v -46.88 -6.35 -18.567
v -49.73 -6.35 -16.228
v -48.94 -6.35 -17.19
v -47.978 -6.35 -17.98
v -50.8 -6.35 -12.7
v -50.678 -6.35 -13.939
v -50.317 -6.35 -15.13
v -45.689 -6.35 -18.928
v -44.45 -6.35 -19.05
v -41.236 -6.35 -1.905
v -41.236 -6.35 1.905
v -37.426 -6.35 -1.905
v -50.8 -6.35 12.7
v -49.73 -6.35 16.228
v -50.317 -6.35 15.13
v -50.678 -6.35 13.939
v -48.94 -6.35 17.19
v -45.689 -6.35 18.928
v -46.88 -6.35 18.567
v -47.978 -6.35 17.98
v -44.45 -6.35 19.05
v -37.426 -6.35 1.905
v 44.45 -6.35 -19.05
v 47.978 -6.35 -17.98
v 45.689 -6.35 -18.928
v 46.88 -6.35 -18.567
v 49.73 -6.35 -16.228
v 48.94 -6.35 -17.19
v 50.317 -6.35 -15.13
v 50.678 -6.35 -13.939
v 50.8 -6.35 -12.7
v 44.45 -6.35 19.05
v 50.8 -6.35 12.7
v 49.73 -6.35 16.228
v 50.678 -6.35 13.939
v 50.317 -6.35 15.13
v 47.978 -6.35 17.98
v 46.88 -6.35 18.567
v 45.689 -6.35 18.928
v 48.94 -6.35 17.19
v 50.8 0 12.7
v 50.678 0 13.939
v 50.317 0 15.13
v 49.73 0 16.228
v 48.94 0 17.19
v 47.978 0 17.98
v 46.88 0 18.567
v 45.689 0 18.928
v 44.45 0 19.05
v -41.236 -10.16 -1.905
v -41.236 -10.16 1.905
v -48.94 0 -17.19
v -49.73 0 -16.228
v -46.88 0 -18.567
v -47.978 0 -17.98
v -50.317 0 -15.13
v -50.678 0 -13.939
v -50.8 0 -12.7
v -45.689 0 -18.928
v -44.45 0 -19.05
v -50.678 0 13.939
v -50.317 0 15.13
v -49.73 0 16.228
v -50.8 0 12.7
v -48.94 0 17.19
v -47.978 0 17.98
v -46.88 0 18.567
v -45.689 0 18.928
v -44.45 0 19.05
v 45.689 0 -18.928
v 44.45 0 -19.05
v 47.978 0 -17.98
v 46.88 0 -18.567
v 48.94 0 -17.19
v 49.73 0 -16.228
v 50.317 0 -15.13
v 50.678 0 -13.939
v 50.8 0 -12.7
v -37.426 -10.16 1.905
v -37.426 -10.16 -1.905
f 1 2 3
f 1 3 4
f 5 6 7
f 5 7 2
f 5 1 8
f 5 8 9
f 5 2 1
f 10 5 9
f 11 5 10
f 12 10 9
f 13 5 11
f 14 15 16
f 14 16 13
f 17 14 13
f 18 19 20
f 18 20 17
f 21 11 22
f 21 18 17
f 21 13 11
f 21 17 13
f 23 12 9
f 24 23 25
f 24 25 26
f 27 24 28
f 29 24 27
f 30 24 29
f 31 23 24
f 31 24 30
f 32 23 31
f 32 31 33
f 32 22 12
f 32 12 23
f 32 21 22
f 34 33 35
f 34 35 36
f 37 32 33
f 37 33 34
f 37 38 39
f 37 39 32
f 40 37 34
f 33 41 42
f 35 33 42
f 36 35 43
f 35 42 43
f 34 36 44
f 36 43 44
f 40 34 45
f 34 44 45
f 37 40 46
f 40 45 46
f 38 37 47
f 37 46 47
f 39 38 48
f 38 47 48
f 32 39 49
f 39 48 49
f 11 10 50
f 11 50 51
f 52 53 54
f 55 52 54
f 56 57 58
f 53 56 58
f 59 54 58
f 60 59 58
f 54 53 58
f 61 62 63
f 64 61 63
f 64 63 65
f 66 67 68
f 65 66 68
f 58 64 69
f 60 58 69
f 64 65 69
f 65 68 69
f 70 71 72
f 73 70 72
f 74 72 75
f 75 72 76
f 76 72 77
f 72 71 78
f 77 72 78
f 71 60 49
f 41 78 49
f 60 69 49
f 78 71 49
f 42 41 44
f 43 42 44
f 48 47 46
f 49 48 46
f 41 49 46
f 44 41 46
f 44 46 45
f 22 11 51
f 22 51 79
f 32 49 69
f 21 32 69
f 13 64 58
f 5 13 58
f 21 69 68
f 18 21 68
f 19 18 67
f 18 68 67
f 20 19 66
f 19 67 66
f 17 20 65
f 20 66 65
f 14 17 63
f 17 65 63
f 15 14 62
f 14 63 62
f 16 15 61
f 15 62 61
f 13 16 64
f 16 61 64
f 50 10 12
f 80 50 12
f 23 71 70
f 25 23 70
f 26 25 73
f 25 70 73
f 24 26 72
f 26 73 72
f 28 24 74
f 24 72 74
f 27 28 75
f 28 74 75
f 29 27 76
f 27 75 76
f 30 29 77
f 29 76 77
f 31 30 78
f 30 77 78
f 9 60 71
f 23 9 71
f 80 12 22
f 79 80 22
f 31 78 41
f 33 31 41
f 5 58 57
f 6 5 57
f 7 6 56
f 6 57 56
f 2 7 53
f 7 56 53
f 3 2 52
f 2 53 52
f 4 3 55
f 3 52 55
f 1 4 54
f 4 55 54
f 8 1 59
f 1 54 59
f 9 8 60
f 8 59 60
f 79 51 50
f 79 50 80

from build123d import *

# Parameters (mm, degrees)
F1_DEPTH = 6.35
F2_W     = 3.81
F2_H     = 3.81
F3_DEPTH = 3.81


with BuildPart() as f1:
    # F0 (on Front) → F1 (new body)
    with BuildSketch(Plane.XZ):
        with BuildLine():
            ThreePointArc((-50.8, -12.7), (-48.940128, -17.190128), (-44.45, -19.05))
            Line((-44.45, -19.05), (44.45, -19.05))
            ThreePointArc((44.45, -19.05), (48.940128, -17.190128), (50.8, -12.7))
            Line((50.8, -12.7), (50.8, 12.7))
            ThreePointArc((50.8, 12.7), (48.940128, 17.190128), (44.45, 19.05))
            Line((44.45, 19.05), (-44.45, 19.05))
            ThreePointArc((-44.45, 19.05), (-48.940128, 17.190128), (-50.8, 12.7))
            Line((-50.8, 12.7), (-50.8, -12.7))
        make_face()
    extrude(amount=F1_DEPTH)

    # F2 (on face) → F3 (join)
    with BuildSketch(Plane.XZ.offset(6.35)):
        with Locations((-39.331302, 0)):
            Rectangle(F2_W, F2_H)
    extrude(amount=F3_DEPTH)


solid = f1.part
